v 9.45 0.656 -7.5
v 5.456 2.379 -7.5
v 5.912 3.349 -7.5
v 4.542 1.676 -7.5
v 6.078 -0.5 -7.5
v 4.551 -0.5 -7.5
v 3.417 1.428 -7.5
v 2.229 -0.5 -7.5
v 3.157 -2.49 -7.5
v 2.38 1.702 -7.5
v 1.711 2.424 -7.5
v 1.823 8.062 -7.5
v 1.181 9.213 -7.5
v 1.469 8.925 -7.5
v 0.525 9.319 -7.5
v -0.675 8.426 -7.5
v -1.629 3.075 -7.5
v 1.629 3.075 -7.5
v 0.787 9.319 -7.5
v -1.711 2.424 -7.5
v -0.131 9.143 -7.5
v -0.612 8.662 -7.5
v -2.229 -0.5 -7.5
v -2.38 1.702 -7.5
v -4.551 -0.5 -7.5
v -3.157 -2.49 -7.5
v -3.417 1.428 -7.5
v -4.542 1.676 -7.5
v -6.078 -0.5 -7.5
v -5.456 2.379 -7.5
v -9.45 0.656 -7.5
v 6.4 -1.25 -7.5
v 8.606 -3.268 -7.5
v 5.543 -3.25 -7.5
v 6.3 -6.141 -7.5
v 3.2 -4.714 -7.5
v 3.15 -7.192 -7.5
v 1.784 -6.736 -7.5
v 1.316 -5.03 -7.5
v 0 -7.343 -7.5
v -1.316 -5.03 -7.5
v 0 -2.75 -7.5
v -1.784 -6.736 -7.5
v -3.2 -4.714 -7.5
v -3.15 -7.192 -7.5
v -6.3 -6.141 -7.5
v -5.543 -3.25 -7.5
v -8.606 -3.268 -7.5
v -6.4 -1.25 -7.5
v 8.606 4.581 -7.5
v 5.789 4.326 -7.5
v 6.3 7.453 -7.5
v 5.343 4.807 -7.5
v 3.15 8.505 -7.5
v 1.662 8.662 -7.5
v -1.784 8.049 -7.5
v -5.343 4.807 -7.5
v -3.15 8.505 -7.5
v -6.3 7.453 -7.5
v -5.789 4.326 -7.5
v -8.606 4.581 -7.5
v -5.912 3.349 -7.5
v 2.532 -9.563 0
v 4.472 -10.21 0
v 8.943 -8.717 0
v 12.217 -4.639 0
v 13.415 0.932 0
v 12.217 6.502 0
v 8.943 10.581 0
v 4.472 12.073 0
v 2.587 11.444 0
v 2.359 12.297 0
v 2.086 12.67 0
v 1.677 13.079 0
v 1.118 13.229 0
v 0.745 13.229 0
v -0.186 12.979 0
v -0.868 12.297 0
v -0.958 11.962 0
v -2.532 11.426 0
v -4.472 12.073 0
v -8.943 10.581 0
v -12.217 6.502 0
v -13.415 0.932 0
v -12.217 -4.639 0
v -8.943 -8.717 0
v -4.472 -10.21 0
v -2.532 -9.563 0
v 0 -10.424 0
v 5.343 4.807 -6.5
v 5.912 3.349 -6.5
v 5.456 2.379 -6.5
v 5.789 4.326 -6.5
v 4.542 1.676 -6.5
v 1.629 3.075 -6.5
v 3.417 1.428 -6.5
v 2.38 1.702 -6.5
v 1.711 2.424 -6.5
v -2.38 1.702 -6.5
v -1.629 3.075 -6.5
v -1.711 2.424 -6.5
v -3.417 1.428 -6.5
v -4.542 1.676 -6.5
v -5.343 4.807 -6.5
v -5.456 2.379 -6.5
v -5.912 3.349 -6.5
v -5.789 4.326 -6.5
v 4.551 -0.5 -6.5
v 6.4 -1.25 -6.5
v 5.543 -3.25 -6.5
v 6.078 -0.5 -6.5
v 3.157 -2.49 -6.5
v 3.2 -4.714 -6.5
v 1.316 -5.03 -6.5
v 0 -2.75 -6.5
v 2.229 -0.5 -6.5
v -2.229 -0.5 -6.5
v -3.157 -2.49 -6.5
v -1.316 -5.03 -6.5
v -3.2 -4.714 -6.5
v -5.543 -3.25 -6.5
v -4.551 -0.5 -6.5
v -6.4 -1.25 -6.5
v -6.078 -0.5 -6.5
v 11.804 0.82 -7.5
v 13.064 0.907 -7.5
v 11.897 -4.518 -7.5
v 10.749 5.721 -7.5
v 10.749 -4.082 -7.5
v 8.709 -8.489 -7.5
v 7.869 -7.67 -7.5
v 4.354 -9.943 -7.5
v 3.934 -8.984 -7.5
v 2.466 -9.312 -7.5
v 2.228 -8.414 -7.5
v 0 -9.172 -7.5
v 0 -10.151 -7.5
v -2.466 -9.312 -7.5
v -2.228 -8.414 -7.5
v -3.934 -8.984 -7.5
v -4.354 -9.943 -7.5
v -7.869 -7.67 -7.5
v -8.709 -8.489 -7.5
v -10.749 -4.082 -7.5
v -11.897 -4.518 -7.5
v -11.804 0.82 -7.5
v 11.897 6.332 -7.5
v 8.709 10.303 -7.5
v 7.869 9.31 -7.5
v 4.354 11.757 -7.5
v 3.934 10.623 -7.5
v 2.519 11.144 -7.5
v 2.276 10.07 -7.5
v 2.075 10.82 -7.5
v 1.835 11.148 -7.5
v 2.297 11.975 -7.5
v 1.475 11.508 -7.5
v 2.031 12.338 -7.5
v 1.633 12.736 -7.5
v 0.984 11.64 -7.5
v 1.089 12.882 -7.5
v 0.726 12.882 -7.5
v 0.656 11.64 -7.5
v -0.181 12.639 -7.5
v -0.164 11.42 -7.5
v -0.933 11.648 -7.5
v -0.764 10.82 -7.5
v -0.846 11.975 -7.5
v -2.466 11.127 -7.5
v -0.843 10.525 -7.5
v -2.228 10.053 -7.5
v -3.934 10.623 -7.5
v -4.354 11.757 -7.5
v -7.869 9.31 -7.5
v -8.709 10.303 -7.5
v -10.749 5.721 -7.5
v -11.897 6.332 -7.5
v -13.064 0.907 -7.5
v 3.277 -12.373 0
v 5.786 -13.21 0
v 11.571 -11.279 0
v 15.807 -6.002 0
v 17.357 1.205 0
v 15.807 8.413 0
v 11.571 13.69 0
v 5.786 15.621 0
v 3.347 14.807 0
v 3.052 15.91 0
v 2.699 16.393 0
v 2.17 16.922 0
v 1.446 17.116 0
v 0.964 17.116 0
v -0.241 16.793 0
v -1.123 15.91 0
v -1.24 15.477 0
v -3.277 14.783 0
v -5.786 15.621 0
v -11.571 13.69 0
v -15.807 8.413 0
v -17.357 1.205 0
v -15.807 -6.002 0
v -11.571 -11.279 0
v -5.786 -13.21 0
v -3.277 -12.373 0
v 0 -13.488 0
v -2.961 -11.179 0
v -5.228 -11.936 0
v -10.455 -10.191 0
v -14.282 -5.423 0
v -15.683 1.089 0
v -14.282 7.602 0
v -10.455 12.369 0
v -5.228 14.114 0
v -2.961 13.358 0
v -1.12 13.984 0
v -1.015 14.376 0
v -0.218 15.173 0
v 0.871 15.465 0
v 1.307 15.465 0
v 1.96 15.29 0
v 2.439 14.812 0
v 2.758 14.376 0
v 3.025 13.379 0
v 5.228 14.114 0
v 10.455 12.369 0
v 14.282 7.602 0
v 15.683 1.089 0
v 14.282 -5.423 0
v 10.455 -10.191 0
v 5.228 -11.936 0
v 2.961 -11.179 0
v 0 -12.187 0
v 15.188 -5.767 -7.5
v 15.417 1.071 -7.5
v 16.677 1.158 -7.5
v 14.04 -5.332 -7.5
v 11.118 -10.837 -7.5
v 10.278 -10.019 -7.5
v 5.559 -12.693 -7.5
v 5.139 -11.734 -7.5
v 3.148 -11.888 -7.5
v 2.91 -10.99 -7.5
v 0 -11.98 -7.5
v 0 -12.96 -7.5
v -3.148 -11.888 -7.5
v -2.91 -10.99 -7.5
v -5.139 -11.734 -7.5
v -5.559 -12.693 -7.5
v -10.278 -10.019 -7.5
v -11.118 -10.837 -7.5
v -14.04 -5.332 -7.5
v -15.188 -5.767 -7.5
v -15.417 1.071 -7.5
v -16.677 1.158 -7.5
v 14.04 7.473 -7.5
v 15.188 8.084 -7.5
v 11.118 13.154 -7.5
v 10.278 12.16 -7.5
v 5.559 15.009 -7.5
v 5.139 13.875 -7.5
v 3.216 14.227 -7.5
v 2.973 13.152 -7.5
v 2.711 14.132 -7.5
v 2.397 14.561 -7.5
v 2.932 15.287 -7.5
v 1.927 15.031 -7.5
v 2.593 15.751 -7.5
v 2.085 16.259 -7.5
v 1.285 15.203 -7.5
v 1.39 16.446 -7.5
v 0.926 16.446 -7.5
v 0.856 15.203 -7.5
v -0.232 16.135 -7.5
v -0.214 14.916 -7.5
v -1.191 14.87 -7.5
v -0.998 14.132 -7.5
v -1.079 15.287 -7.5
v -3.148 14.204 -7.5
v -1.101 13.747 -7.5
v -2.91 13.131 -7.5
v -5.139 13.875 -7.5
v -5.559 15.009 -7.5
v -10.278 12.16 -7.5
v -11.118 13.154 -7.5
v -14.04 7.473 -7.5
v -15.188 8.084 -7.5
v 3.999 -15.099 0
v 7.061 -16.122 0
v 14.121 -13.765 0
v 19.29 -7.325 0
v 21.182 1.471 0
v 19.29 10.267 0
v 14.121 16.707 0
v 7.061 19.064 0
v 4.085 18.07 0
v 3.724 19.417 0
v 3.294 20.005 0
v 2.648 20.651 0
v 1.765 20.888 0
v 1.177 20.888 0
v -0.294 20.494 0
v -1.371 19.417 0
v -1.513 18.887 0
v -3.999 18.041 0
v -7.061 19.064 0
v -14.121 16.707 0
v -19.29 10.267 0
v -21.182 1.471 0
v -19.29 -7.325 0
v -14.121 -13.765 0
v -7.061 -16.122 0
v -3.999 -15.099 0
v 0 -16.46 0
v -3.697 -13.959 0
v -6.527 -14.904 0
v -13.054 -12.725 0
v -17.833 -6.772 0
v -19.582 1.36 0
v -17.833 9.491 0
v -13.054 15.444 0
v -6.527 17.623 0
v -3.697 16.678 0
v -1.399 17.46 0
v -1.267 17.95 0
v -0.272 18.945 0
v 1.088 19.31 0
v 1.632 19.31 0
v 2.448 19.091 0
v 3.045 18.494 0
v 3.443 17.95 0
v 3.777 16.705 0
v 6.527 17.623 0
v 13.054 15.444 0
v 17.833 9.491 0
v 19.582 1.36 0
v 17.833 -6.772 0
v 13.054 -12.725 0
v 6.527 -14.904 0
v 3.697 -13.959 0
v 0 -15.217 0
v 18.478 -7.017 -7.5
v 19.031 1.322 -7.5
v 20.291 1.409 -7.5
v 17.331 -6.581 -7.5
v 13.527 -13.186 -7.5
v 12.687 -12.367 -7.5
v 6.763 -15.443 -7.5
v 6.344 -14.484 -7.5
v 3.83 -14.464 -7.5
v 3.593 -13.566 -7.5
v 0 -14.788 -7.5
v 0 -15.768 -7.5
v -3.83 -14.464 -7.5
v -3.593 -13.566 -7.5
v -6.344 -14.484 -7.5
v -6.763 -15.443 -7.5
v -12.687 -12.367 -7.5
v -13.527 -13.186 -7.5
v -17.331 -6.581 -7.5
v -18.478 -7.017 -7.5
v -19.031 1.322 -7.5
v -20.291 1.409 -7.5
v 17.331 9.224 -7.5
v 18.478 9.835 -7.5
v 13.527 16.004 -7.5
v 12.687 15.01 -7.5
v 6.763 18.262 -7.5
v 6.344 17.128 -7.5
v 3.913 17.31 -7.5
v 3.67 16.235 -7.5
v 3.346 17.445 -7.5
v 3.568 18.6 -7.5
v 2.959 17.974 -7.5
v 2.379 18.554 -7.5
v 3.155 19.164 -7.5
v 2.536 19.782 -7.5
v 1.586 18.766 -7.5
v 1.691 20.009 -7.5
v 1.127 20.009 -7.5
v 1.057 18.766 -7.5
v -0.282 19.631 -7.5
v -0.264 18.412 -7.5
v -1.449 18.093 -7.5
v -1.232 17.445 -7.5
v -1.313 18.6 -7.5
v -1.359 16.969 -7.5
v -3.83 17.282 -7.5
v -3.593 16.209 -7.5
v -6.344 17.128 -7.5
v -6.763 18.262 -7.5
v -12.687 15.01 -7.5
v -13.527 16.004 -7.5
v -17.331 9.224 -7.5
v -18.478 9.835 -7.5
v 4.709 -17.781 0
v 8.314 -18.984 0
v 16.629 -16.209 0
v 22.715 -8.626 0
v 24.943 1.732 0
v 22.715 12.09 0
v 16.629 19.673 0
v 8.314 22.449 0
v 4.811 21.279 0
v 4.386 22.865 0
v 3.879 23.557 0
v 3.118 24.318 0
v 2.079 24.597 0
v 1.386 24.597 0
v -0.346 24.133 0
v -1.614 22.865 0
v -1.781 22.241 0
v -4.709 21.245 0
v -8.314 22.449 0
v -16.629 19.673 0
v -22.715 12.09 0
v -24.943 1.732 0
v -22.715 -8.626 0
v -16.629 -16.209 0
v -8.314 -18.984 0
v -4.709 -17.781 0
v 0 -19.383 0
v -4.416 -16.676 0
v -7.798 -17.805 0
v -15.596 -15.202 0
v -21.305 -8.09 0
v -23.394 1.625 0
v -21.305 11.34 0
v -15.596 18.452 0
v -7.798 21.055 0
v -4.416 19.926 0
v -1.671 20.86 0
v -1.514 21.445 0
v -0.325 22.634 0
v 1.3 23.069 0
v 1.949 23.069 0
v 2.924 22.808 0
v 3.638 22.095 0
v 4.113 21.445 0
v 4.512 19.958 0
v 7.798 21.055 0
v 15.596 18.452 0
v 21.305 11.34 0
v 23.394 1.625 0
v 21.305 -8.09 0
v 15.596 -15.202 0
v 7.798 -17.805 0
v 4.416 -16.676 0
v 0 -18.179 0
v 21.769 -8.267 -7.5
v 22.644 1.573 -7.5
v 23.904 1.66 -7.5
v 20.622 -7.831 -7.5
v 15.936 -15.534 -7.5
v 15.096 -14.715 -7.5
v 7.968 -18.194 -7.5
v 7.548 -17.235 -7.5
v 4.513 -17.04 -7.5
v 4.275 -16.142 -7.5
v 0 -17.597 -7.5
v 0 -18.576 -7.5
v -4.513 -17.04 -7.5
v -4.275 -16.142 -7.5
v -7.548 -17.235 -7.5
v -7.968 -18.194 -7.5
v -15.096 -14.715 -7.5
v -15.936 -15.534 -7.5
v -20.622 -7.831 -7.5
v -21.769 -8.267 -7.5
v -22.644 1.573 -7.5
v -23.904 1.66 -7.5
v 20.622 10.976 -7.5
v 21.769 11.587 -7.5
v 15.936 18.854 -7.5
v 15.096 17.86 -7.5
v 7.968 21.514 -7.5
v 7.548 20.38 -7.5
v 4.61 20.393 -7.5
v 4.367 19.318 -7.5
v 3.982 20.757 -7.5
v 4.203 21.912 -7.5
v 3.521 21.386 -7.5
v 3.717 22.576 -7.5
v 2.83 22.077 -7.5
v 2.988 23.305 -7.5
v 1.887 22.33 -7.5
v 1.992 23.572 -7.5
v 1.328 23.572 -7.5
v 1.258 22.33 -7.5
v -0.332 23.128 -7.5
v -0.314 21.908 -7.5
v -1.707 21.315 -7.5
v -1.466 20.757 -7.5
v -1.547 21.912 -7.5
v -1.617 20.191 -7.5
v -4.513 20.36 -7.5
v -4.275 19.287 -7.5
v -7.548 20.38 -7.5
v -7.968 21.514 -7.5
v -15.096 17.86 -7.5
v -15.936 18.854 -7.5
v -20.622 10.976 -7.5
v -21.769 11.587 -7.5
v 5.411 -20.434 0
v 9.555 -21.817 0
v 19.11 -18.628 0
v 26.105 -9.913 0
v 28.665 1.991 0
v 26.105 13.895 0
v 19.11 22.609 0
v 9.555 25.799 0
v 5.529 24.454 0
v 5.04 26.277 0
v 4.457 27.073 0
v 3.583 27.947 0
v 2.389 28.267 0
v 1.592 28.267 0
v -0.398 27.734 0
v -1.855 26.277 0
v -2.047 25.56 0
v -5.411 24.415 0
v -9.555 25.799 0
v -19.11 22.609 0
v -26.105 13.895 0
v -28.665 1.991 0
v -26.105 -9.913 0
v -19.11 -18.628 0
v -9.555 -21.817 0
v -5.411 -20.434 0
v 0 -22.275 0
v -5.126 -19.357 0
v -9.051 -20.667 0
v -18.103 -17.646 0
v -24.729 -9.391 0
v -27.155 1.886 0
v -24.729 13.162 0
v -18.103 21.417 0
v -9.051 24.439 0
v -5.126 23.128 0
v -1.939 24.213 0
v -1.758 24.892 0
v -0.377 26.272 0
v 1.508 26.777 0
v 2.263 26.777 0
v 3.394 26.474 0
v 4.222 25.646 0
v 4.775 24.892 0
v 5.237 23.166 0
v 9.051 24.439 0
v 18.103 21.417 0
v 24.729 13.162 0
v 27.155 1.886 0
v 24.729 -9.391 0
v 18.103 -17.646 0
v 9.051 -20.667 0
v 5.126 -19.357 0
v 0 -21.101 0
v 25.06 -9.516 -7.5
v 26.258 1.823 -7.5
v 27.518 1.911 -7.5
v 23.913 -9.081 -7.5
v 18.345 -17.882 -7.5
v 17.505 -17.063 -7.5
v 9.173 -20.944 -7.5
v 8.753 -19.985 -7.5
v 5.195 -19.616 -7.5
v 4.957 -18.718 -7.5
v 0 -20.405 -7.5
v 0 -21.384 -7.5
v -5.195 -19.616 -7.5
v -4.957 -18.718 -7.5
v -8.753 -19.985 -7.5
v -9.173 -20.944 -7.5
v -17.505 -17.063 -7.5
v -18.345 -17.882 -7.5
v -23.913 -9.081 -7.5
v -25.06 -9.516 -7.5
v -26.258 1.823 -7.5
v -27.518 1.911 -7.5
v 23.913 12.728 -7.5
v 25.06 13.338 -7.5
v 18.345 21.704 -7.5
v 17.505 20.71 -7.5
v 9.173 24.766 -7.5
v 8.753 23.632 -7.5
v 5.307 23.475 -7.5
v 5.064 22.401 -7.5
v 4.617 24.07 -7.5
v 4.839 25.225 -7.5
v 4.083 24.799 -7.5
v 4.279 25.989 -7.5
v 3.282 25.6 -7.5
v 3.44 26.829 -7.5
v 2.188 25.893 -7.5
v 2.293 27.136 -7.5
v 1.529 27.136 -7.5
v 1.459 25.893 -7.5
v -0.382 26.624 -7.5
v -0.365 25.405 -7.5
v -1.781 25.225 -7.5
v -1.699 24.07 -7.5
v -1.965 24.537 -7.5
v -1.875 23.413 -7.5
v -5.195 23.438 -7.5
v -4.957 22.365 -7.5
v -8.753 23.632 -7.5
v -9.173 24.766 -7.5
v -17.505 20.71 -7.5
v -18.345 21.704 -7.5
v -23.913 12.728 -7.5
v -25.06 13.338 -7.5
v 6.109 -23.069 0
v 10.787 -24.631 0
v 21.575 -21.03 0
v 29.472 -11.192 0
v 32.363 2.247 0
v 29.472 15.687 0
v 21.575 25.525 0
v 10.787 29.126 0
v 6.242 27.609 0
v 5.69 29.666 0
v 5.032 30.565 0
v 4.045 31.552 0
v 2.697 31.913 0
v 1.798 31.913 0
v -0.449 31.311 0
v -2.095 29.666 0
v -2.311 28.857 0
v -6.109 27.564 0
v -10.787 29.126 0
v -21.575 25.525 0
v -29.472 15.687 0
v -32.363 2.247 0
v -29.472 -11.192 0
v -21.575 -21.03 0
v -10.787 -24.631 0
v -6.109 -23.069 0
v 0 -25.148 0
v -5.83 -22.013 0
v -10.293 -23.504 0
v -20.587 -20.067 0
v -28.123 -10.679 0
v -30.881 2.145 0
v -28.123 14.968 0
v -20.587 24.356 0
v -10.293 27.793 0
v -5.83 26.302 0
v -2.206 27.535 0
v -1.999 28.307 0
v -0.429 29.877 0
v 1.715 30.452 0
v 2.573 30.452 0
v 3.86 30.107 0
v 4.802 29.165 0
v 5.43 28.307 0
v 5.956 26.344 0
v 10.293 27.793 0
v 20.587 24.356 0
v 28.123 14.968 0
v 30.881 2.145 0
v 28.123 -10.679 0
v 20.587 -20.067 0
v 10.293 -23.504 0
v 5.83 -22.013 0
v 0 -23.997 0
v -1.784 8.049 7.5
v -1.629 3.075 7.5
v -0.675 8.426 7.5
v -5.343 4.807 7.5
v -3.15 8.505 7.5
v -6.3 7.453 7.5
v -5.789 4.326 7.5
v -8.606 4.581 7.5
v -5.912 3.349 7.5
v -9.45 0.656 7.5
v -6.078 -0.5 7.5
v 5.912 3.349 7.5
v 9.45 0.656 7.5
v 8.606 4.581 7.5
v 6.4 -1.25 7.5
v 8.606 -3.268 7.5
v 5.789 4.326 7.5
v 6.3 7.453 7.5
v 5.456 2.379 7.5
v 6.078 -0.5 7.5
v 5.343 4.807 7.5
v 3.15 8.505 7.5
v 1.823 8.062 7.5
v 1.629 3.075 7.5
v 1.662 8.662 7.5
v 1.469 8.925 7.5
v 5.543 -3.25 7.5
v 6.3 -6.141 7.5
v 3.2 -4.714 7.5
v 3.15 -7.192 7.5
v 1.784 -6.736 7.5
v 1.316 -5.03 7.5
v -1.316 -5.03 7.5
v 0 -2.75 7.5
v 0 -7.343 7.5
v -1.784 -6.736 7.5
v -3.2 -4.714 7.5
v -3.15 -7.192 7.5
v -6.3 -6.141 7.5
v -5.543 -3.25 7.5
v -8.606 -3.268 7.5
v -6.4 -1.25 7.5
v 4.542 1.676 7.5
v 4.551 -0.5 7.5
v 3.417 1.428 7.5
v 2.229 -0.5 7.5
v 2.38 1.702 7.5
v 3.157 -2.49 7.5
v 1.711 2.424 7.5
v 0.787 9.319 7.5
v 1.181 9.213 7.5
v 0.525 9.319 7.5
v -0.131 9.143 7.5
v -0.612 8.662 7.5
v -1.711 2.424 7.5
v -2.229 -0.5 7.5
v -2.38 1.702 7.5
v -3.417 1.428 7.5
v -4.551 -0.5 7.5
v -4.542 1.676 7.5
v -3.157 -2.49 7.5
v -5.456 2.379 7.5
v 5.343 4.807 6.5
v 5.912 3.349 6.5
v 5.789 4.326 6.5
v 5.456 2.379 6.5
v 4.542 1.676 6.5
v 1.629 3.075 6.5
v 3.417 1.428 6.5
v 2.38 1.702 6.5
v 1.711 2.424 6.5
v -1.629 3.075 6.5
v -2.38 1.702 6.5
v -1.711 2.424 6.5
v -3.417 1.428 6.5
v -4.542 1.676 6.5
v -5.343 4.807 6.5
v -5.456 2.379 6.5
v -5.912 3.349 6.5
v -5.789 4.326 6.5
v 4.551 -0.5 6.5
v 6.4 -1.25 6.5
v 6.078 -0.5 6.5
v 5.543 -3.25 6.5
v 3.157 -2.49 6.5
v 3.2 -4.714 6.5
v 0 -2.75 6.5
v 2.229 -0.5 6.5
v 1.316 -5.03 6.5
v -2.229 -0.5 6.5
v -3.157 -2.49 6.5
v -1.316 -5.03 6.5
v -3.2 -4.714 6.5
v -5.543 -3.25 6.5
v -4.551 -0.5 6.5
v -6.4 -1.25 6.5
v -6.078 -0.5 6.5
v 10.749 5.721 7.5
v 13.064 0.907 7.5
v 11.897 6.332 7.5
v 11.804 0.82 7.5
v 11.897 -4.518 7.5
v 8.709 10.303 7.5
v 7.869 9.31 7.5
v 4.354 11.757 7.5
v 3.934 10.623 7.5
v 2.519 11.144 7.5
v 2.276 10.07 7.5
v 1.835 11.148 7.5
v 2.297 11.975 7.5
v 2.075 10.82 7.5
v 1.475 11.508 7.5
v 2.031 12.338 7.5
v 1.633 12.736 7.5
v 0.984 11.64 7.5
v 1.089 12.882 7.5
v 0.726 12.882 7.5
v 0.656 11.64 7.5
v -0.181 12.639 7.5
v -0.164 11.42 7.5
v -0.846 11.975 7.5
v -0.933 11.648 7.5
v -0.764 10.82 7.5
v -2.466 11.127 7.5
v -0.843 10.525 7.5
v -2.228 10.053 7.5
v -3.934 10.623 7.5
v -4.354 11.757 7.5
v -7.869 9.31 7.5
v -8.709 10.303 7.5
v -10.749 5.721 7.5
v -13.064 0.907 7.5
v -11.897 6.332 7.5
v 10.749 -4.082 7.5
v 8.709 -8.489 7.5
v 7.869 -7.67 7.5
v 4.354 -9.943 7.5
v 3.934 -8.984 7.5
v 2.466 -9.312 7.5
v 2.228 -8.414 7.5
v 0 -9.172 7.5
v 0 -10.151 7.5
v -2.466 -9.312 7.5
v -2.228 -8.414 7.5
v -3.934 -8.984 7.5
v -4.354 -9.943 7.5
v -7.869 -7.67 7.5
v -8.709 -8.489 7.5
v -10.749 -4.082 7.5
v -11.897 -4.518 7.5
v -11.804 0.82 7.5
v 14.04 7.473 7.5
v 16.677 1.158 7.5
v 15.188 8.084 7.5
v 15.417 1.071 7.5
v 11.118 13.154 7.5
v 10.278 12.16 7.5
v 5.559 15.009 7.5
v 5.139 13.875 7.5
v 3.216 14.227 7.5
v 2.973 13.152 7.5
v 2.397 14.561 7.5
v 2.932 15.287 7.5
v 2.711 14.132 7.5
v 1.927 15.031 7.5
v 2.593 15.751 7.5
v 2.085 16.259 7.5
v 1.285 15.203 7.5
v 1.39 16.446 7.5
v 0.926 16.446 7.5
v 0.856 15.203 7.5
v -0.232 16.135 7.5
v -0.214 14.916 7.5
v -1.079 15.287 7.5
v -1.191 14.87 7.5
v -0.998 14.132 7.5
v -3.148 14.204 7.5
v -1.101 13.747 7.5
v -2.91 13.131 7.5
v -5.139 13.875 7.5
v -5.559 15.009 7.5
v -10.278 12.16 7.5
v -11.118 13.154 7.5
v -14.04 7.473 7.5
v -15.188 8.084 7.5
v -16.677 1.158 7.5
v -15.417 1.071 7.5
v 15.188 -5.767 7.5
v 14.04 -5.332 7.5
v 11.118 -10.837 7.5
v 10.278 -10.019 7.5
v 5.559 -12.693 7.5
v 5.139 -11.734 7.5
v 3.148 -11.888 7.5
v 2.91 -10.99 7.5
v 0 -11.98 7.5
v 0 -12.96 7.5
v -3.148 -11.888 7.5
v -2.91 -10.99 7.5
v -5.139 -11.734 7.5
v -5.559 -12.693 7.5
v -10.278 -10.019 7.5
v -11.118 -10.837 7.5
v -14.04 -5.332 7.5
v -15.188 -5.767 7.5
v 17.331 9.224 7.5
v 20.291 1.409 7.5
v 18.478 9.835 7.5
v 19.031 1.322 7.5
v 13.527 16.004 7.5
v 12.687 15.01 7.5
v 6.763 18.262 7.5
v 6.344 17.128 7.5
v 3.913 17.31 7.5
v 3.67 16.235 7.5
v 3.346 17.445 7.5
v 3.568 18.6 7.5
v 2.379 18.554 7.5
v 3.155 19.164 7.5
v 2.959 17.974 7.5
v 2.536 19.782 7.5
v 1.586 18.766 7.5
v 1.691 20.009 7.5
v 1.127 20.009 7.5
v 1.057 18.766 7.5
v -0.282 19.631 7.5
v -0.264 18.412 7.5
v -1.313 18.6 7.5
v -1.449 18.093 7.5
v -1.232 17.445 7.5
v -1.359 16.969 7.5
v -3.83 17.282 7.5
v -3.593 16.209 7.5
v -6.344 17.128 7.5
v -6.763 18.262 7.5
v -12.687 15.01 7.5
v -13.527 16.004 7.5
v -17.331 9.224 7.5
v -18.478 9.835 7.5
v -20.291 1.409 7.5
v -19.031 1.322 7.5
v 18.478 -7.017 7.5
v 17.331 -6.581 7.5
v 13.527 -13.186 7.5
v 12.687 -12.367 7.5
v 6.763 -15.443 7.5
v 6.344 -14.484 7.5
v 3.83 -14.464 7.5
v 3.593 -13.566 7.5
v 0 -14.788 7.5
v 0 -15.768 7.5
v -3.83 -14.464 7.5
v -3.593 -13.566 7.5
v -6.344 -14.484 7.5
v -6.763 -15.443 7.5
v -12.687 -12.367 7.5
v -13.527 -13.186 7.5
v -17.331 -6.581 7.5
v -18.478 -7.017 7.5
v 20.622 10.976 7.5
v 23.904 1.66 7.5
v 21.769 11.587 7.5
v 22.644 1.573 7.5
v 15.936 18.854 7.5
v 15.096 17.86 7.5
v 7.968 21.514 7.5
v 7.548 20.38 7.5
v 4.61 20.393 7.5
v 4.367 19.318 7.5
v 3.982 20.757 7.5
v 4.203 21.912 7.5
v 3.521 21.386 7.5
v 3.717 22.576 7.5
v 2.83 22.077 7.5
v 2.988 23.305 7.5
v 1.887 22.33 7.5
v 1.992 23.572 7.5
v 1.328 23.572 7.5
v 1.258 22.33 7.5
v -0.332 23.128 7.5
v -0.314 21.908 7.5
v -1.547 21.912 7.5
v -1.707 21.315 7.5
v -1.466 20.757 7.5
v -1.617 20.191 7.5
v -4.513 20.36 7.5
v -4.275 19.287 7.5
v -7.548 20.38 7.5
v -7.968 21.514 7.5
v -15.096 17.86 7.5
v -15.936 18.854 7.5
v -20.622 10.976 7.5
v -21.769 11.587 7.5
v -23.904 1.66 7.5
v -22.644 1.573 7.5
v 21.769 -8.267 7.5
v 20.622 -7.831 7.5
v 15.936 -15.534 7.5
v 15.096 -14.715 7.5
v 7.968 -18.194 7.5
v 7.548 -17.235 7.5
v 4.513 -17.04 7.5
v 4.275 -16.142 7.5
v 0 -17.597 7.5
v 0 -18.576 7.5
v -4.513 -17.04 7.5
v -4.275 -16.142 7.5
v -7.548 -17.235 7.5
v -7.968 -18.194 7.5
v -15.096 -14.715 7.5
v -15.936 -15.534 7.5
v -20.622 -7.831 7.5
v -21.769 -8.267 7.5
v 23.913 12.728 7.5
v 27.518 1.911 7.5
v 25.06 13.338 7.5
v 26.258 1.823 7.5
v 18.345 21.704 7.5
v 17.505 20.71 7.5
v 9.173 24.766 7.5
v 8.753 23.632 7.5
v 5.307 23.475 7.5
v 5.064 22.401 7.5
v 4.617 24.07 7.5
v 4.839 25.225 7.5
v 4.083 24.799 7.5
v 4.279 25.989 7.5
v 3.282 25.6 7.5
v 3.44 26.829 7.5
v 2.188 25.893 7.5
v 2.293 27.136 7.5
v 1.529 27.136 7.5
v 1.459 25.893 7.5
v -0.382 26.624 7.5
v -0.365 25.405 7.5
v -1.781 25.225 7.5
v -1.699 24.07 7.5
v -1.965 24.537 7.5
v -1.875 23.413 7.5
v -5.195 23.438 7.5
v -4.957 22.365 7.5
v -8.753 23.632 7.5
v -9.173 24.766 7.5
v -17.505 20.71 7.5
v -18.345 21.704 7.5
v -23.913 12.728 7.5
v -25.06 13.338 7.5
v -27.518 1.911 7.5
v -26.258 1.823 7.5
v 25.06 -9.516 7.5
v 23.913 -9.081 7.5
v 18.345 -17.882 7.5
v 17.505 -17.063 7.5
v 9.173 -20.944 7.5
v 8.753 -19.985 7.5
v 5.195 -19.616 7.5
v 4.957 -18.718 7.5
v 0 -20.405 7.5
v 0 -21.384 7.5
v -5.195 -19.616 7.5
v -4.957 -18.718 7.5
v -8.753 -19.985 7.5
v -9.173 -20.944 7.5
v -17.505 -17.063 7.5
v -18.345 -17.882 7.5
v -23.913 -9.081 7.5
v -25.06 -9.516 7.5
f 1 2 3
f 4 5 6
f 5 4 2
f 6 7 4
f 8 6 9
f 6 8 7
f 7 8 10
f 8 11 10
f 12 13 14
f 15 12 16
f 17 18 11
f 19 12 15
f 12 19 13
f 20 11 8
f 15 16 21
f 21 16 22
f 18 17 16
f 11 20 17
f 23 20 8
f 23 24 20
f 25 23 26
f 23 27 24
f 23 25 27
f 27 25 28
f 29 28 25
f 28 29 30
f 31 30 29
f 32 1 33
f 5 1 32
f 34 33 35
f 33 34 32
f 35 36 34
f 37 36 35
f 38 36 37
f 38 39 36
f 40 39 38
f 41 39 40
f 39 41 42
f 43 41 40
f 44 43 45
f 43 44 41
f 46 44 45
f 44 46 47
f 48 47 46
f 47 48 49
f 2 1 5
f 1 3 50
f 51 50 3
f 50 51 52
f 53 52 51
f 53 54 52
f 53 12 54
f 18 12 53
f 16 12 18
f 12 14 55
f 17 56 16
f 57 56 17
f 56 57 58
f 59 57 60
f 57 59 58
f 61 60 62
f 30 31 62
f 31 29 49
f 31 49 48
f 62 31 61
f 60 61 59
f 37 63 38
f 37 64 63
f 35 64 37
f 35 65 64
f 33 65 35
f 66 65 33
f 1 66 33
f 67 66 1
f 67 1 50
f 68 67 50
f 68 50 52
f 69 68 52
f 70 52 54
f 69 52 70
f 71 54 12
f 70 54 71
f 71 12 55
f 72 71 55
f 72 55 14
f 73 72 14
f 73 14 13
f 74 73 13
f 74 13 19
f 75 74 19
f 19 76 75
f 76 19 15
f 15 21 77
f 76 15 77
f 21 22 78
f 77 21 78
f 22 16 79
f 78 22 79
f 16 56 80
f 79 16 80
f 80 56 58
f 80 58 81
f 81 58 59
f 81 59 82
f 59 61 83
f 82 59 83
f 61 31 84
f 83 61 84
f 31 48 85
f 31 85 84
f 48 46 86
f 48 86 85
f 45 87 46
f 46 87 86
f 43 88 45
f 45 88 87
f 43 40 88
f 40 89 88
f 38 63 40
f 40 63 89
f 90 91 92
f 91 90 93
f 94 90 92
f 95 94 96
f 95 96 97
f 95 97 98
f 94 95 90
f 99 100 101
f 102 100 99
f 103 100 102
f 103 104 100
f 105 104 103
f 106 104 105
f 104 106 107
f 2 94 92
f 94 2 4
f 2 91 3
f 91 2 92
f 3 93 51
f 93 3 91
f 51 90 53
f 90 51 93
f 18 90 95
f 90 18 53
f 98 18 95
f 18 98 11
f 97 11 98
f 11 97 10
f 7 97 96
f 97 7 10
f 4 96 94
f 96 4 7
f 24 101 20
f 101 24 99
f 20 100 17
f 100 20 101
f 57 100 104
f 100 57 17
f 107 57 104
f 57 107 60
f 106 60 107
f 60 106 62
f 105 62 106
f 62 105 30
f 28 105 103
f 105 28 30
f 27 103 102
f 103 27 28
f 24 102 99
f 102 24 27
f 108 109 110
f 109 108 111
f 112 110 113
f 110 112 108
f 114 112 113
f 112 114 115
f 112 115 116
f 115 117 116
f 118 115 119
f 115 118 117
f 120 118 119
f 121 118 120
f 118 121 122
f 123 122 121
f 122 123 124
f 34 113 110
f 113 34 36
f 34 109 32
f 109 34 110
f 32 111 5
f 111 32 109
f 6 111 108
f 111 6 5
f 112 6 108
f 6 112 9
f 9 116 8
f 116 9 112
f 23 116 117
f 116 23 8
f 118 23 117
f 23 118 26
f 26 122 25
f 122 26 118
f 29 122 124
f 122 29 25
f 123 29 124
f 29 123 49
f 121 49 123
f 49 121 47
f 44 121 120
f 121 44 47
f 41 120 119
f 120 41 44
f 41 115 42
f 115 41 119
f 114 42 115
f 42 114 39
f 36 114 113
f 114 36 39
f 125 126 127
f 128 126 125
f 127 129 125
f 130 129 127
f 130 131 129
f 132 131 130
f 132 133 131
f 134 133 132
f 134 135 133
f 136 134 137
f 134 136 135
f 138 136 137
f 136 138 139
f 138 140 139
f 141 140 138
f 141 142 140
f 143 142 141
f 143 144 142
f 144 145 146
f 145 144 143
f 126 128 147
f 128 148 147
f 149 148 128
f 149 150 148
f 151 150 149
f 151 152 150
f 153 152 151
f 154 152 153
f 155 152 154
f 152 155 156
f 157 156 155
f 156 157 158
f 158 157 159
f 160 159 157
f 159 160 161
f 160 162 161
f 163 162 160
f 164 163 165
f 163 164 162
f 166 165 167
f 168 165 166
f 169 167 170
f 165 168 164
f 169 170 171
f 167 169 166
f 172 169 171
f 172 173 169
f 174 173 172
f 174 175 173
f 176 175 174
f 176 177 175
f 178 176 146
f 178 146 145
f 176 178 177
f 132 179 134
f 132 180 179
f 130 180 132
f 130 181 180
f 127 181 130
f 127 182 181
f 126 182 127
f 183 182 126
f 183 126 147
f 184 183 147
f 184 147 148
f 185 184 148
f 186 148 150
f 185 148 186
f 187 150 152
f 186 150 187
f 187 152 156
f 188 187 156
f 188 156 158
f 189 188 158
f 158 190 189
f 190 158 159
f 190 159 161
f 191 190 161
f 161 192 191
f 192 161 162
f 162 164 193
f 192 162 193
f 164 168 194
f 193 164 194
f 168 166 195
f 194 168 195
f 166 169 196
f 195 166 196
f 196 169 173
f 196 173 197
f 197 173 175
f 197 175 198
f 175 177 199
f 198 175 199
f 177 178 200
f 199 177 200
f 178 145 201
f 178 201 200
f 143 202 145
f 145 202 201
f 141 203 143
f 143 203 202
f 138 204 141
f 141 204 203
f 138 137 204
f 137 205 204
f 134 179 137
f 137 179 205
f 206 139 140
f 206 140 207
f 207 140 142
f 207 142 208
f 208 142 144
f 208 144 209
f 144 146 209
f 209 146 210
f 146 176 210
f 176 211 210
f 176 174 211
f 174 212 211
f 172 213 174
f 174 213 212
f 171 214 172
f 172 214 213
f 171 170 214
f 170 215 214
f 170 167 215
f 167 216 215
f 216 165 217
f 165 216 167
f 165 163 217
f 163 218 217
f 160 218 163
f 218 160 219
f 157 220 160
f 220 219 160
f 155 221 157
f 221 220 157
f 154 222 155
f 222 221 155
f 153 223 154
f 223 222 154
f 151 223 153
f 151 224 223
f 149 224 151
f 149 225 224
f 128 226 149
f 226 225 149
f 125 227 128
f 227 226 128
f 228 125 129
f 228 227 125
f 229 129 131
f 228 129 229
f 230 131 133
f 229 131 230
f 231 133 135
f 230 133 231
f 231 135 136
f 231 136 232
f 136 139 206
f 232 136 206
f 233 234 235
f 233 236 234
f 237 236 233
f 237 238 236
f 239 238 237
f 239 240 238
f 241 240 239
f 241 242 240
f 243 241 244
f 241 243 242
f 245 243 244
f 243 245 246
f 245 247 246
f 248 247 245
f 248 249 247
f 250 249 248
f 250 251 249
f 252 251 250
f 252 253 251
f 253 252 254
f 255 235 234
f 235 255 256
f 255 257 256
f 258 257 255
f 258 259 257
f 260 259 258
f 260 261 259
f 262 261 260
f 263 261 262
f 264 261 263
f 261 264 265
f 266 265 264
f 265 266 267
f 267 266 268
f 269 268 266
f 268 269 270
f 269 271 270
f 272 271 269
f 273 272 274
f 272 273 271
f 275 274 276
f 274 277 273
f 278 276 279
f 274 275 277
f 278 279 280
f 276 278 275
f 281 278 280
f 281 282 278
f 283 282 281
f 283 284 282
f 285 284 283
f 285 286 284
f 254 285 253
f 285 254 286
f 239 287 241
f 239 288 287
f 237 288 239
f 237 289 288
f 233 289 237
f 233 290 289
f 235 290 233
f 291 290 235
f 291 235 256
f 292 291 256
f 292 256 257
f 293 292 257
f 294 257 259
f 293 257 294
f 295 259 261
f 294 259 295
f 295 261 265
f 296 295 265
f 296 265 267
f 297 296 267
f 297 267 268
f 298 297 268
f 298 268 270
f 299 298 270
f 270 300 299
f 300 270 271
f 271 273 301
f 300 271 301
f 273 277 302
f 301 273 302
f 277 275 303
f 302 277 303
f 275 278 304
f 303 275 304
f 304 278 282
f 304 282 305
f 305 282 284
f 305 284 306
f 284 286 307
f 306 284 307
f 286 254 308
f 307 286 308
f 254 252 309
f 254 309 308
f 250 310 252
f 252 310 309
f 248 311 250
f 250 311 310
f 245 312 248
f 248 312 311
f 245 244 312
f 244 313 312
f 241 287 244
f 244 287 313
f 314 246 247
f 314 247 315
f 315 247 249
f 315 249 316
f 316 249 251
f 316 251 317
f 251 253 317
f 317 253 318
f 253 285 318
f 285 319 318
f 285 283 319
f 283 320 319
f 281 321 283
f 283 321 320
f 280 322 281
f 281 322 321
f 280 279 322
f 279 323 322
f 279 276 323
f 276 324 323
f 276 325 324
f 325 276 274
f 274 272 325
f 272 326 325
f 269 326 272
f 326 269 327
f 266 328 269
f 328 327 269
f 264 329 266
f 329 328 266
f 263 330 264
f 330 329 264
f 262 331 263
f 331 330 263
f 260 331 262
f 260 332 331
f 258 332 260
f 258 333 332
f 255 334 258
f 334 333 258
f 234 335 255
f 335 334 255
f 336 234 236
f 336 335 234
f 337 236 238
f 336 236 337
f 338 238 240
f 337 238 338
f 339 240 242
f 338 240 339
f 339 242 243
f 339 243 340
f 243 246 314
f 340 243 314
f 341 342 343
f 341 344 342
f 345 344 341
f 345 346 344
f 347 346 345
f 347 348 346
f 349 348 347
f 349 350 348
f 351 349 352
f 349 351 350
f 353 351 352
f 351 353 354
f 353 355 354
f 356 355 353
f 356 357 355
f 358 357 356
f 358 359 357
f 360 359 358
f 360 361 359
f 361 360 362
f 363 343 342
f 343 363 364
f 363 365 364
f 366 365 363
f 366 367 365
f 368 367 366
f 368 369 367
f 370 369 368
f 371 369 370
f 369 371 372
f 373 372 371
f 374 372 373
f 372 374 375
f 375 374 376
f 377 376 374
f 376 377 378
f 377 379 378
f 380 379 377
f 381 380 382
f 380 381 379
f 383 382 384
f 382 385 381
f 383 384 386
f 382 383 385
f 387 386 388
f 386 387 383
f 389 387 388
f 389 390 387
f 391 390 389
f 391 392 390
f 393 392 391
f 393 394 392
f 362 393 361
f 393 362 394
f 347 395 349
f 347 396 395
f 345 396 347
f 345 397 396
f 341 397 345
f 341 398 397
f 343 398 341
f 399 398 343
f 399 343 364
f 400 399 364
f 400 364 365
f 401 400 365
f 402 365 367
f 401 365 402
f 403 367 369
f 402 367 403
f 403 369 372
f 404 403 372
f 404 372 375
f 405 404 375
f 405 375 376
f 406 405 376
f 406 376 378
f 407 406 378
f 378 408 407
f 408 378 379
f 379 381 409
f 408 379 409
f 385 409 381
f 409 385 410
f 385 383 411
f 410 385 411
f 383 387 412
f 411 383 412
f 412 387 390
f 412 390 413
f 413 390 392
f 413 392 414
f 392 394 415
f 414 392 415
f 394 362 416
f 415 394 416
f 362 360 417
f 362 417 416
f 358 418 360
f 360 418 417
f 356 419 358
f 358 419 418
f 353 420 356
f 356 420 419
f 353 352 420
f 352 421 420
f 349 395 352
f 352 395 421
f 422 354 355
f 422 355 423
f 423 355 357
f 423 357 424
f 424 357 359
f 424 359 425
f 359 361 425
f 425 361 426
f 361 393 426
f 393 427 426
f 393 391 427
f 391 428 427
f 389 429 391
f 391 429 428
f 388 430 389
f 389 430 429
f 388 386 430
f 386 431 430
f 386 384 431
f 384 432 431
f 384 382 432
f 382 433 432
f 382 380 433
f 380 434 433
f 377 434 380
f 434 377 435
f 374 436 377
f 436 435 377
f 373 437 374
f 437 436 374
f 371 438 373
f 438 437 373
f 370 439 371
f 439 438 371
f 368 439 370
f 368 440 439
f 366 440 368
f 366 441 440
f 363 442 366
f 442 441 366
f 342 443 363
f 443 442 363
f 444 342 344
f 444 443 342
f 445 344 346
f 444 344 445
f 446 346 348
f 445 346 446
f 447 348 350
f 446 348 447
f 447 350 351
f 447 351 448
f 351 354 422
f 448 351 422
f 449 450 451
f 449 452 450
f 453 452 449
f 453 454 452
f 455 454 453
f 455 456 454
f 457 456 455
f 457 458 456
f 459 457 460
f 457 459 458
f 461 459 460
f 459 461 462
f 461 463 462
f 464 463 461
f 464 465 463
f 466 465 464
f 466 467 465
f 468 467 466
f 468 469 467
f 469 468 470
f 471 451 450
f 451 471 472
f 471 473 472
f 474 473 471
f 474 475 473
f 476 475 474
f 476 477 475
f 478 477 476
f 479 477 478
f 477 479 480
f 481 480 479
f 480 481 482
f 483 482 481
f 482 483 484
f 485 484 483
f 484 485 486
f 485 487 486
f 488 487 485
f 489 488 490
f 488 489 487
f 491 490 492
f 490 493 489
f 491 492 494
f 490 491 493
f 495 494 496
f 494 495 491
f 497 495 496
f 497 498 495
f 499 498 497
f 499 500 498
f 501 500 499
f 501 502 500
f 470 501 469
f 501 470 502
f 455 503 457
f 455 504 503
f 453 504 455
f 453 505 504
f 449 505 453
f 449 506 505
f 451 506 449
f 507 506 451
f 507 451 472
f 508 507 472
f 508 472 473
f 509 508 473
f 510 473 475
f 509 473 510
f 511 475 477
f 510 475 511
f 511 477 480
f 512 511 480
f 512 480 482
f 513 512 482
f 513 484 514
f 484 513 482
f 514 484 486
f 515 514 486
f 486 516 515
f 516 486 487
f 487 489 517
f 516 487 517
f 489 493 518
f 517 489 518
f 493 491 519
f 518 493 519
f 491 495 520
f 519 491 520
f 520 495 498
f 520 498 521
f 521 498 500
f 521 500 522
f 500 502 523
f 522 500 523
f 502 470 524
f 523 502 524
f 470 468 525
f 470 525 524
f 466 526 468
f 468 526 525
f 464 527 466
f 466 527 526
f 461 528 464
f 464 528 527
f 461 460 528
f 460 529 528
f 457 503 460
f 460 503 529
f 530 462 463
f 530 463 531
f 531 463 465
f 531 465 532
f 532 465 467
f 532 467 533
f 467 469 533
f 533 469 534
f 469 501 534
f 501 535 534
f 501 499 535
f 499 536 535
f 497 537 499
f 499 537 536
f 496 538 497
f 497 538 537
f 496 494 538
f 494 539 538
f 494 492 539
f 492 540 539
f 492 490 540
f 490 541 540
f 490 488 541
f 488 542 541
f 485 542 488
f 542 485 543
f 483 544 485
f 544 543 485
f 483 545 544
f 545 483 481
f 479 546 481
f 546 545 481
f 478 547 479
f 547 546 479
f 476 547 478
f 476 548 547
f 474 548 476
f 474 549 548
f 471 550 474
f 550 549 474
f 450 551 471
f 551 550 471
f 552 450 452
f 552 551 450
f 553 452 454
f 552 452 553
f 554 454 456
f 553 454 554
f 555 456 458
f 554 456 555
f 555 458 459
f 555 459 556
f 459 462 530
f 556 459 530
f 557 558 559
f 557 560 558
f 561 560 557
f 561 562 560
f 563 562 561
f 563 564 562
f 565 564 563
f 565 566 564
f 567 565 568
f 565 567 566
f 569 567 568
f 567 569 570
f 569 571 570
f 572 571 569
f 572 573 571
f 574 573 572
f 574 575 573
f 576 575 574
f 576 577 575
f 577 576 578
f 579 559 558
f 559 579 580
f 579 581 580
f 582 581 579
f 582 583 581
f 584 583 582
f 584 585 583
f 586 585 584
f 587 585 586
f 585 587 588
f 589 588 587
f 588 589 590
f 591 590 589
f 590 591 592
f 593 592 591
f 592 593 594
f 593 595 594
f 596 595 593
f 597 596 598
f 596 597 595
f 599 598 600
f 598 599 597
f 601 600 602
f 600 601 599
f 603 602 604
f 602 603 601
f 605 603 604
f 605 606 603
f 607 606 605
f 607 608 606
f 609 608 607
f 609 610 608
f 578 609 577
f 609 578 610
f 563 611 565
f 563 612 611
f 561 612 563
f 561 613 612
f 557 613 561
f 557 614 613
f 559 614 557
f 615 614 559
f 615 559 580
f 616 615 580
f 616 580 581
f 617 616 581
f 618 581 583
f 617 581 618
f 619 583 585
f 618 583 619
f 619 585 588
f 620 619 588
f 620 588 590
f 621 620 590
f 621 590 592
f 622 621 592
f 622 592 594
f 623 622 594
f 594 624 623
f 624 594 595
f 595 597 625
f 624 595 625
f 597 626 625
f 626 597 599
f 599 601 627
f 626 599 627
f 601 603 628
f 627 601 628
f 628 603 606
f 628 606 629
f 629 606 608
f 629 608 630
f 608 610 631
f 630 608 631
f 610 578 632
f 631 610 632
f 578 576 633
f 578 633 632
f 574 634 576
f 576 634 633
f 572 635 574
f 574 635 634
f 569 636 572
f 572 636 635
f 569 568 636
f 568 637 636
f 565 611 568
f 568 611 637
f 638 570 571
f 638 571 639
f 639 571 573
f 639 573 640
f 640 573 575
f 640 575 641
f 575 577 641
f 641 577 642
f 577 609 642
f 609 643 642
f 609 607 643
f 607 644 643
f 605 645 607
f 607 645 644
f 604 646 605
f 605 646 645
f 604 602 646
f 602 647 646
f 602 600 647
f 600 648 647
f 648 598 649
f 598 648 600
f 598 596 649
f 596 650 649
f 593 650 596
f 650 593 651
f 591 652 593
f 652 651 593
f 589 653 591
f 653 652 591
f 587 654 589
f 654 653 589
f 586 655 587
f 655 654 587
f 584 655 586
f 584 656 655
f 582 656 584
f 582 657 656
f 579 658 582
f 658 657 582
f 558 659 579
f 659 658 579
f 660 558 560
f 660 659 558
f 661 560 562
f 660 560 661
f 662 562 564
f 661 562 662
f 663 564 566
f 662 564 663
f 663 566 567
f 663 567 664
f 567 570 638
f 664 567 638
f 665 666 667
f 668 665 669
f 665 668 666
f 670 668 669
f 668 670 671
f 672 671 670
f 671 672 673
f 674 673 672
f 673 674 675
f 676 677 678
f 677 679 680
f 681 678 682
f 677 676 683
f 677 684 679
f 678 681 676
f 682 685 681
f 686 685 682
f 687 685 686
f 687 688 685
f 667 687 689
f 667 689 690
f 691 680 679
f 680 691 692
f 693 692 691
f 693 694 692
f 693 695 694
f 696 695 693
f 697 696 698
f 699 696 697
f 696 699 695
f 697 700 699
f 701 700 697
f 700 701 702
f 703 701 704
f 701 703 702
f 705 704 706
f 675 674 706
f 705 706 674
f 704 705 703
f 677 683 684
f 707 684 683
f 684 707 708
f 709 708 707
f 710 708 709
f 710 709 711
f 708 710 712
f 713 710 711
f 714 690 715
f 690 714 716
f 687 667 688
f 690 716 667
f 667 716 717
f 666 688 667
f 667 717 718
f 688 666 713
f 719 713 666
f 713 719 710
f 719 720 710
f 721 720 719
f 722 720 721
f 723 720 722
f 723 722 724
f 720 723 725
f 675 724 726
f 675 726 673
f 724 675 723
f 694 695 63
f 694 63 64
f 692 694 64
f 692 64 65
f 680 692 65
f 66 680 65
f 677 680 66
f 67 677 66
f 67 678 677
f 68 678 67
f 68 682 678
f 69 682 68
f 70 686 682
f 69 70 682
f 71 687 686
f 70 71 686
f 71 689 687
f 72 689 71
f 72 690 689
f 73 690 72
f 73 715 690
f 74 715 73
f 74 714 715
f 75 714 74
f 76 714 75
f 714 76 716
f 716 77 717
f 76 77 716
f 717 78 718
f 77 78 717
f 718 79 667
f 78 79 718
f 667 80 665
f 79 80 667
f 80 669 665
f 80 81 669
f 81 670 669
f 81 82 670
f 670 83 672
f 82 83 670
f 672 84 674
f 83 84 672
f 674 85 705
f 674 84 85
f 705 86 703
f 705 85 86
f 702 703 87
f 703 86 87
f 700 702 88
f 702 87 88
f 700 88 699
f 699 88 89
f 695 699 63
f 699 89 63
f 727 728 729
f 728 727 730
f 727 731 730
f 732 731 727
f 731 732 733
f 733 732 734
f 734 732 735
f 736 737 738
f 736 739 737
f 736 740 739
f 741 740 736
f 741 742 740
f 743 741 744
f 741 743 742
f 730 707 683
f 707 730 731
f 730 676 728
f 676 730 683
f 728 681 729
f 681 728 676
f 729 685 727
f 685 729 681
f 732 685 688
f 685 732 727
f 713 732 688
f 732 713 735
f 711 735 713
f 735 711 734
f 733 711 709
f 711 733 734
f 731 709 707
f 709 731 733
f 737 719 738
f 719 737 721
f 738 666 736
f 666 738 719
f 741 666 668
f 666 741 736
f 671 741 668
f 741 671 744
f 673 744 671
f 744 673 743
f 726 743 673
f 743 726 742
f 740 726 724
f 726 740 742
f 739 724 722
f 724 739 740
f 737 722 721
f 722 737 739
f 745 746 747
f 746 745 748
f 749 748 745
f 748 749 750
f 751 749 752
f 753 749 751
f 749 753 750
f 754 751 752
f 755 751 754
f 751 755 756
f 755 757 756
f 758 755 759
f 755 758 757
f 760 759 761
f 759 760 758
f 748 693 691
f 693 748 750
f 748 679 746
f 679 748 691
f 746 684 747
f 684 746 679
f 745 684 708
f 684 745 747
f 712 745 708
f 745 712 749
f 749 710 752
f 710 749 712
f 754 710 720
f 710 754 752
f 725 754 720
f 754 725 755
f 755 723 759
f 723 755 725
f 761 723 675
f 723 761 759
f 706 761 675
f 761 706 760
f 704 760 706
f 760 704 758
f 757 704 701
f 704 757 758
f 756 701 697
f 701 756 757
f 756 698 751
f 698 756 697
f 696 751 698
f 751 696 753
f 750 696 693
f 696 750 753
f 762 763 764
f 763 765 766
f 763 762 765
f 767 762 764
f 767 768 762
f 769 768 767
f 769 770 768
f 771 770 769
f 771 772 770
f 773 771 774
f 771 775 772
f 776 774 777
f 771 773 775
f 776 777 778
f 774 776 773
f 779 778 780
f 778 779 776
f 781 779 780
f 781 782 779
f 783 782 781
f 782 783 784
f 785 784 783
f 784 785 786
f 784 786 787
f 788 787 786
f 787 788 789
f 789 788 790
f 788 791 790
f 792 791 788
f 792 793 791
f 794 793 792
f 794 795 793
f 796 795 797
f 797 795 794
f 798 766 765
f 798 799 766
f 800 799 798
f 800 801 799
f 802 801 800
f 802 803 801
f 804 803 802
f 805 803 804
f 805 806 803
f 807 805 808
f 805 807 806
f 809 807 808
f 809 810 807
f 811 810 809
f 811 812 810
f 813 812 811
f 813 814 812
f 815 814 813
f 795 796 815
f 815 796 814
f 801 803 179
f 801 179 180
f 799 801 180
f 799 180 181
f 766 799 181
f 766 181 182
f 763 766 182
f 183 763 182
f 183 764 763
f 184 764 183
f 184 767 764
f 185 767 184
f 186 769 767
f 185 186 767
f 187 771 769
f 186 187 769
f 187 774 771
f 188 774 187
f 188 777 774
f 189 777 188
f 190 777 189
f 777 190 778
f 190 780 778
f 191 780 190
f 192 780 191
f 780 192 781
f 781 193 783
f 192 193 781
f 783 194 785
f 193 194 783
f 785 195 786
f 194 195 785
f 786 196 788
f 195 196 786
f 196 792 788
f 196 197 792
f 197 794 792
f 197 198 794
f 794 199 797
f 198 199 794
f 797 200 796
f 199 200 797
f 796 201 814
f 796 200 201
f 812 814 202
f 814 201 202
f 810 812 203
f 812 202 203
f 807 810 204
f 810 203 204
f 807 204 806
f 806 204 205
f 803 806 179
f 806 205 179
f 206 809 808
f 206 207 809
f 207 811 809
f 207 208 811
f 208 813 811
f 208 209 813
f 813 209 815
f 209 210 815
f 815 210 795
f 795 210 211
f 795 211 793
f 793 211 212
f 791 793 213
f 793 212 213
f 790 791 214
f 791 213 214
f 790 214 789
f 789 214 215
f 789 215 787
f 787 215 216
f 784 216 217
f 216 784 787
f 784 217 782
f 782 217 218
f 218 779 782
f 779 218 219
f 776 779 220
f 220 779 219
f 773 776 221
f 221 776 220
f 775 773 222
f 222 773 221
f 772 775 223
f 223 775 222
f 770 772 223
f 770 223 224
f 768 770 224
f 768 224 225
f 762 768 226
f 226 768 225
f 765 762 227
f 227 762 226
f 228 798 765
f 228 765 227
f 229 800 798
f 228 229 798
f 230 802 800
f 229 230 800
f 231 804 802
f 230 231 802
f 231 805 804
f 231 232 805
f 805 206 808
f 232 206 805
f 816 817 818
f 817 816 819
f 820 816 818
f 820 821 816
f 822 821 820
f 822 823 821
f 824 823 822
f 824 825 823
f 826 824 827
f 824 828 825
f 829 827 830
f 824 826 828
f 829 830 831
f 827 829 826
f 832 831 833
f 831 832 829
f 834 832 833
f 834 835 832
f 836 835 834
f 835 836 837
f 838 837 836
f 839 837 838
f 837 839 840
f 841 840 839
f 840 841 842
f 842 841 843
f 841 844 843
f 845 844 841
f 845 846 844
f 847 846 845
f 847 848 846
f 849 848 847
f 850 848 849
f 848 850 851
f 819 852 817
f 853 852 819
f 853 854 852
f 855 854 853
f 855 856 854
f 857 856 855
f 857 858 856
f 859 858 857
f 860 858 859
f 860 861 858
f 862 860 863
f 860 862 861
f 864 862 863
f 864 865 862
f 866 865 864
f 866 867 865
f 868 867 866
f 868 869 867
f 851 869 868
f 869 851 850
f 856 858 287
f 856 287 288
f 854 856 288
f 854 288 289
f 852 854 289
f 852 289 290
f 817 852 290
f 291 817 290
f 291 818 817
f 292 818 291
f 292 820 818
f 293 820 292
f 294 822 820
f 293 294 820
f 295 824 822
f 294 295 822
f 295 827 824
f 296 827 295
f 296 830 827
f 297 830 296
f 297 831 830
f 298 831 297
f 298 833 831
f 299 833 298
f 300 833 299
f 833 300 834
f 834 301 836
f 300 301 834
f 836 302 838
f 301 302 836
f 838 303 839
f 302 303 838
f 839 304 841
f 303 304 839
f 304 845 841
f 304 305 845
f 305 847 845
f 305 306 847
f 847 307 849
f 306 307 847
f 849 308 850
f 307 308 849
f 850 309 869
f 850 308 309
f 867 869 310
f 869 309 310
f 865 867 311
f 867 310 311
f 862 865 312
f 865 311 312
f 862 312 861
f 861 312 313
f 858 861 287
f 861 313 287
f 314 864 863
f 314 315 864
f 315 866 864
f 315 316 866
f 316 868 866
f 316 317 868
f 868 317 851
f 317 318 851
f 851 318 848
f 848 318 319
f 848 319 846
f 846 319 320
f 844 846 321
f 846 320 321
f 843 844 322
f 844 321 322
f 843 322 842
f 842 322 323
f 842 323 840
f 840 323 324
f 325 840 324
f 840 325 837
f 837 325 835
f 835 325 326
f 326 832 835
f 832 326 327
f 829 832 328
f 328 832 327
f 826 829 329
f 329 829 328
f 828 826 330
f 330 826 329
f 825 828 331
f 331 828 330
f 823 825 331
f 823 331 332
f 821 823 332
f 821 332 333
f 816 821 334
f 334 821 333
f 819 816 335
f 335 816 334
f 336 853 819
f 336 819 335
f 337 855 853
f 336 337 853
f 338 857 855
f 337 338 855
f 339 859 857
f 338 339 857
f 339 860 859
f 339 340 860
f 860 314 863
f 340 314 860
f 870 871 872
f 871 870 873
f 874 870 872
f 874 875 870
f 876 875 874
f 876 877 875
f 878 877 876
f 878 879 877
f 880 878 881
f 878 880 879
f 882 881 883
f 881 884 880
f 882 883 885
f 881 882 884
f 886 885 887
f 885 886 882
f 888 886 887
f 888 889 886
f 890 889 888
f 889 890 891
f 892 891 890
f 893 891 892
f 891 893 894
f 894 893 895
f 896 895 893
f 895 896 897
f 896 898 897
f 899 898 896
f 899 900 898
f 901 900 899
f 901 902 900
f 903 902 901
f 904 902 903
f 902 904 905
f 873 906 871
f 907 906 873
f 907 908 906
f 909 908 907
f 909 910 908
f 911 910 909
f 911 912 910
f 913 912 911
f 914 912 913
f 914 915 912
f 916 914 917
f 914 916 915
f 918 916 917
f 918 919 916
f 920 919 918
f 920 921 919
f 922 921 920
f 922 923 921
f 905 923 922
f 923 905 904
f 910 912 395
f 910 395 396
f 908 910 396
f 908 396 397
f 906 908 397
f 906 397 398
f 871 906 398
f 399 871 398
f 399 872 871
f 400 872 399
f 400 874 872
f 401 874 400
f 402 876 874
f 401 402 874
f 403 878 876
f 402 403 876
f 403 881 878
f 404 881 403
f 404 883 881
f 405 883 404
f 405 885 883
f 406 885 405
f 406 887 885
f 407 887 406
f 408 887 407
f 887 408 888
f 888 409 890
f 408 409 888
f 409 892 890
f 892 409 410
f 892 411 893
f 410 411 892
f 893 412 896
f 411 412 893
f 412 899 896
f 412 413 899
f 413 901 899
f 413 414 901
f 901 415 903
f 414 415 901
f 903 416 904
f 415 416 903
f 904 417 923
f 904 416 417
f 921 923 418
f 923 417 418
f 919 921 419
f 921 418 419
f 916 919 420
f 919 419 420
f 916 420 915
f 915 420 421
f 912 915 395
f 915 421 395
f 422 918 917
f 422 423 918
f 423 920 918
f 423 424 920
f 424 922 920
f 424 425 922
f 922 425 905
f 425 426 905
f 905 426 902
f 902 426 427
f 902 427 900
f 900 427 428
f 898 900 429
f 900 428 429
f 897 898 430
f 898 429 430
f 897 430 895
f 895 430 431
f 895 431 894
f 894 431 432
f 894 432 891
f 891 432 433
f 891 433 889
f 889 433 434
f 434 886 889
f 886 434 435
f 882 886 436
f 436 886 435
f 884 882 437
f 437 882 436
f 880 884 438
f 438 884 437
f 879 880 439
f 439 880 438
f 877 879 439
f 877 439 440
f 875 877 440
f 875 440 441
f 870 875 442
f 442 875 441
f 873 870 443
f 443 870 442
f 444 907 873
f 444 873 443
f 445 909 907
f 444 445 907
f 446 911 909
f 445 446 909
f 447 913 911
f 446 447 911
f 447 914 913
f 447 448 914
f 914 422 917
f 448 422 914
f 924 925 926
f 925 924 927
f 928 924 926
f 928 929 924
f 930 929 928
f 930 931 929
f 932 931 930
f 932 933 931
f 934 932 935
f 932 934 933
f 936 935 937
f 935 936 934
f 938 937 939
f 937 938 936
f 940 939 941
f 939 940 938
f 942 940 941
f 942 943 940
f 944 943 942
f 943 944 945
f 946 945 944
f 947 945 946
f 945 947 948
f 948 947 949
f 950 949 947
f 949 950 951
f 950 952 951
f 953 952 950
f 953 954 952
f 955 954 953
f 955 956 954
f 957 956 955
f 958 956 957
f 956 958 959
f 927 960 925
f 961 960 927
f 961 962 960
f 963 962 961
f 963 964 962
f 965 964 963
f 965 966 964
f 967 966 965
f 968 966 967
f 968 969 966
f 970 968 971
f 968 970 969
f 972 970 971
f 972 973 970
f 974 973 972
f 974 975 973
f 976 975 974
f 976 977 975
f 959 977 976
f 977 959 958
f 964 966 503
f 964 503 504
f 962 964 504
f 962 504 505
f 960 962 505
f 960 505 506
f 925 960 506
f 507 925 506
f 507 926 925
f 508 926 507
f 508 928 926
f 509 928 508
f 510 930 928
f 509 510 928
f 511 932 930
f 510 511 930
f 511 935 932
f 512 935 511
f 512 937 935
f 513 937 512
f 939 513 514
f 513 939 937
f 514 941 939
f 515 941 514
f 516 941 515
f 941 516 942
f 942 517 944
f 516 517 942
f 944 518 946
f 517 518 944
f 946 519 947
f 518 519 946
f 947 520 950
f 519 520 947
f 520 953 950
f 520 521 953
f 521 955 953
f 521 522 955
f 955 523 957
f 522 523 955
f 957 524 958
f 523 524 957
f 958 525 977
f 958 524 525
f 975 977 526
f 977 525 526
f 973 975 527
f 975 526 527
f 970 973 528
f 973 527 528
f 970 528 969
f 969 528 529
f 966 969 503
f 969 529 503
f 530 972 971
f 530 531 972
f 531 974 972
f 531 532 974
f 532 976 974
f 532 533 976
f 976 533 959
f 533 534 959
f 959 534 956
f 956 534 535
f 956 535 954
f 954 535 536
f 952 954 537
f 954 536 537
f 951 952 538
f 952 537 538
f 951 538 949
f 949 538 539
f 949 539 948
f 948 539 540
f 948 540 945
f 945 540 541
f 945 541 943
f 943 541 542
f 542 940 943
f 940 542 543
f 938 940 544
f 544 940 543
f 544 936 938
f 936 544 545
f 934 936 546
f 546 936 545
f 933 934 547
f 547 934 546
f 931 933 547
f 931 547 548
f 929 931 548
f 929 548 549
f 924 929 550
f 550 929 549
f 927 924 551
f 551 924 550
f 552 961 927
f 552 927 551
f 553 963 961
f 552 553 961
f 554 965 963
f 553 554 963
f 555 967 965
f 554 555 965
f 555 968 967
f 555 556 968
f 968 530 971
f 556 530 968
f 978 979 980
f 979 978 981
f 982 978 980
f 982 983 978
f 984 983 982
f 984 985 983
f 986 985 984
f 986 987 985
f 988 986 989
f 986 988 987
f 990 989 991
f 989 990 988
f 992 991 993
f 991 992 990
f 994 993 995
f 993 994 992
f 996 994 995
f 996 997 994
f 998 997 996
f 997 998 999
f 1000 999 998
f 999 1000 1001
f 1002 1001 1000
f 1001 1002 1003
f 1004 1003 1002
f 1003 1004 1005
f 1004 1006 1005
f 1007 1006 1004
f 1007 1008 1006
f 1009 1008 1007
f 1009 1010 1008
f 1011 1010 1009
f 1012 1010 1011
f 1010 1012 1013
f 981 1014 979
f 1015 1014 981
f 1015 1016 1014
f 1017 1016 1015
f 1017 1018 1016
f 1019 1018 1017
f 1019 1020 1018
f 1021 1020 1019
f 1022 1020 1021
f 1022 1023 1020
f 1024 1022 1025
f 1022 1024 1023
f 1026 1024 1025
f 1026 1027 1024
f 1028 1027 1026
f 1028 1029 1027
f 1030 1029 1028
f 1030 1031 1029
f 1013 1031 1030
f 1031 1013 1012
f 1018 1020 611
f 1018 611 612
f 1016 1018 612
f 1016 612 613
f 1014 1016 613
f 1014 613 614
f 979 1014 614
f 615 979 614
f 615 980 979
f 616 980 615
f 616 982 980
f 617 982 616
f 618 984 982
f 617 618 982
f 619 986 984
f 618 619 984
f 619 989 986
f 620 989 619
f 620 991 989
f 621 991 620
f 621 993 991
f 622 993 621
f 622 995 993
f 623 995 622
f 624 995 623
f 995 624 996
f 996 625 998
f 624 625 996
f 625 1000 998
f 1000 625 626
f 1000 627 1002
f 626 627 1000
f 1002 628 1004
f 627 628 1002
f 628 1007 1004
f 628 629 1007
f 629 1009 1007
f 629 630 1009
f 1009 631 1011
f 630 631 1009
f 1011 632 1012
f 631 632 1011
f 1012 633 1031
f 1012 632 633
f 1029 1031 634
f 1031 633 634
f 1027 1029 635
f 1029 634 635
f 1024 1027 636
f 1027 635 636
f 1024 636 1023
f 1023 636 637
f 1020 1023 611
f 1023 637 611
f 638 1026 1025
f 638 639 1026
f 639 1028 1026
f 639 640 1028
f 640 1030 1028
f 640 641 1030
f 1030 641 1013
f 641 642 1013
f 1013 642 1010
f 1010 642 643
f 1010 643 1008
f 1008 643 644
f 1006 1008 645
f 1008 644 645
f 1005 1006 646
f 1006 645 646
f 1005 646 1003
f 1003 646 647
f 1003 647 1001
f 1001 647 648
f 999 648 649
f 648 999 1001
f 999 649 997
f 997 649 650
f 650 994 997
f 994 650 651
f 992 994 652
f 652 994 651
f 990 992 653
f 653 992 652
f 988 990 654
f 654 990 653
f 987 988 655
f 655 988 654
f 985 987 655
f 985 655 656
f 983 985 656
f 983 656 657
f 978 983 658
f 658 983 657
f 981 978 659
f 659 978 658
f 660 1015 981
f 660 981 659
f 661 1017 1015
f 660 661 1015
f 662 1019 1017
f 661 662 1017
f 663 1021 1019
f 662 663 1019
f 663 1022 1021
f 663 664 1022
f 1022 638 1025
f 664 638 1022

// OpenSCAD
beginning_radius = 7.5;

number_of_polygons = 6;
height = 15;
thickness = 1;
spacing = 1.25;
slope = 0.58;
central_scale = 1;

$fn = 12;
        
fidget_pumpkin(beginning_radius, number_of_polygons, height, thickness, spacing, slope, central_scale);

module fidget_pumpkin(beginning_radius, n, height, thickness, spacing, slope, central_scale) {
    fn = 8;
    theta = 180 / fn;

	y = beginning_radius - beginning_radius * cos(theta);
	dr = y / cos(theta) + thickness + spacing;

    module pumpkin(r) {
        scale(0.7 * r) 
        translate([0, .125]) {
            scale([1, 1.15]) {
                scale([1.2, 1.325])
                    circle(1);

                scale([1.2, 1.3])
                translate([-.5, 0])
                    circle(1);

                scale([1.2, 1.3])
                translate([.5, 0])
                    circle(1);
            }

            hull() {
                translate([.1, 1.4])
                circle(.25);

                translate([.15, 1.5])
                circle(.15);
            }
        }
    }
    
	module eye() {
        scale([1.2, 1] * 1.25)
        difference() {
             circle(1.5);
             translate([0, 2])
                 square(3, center = true);
        }
	}
	
	rs = [for(i = [0: n + 1]) beginning_radius + i * dr];
	
	half_height = height / 2;

	s = [for(i = [1: n + 1]) (rs[i] + slope * half_height) / rs[i]];

	module half() {
	    translate([0, 0, -half_height]) {
		    //translate([0, 0, -4])
			difference() {
				linear_extrude(half_height, scale = s[0])
				scale(central_scale)
					pumpkin(beginning_radius);
					
                
                linear_extrude(thickness * 2, center = true) {
                    translate([beginning_radius * 0.5, beginning_radius * 0.45]) 
                    rotate(25)
                        eye();
                    
                    translate([-beginning_radius * 0.5, beginning_radius * 0.45]) 
                    rotate(-25)
                        eye();
                }
                
                linear_extrude(thickness * 2, center = true)
                difference() {
                    translate([0, -1.25])
                    scale([1.6, 1])
                    difference() {
                        circle(4);
                        translate([0, 4.75])
                            square(8, center = true);
                    }
                    translate([-beginning_radius * 0.45, 0])
                    rotate(-85)
                        circle(2.5, $fn = 3);
                        
                    translate([beginning_radius * 0.45, 0])
                    rotate(-95)
                        circle(2.5, $fn = 3);

                        
                    translate([0, beginning_radius * -0.7])
                    rotate(-30)
                        circle(2.5, $fn = 3);
                }
			}
			
			for(i = [1:n - 1]) {
				linear_extrude(half_height, scale = s[i])
				difference() {
					pumpkin(rs[i]);
				    pumpkin(rs[i] - thickness);
				}					
			}
		}
	}
	
	half();	
	mirror([0, 0, 1])
		half();
}
